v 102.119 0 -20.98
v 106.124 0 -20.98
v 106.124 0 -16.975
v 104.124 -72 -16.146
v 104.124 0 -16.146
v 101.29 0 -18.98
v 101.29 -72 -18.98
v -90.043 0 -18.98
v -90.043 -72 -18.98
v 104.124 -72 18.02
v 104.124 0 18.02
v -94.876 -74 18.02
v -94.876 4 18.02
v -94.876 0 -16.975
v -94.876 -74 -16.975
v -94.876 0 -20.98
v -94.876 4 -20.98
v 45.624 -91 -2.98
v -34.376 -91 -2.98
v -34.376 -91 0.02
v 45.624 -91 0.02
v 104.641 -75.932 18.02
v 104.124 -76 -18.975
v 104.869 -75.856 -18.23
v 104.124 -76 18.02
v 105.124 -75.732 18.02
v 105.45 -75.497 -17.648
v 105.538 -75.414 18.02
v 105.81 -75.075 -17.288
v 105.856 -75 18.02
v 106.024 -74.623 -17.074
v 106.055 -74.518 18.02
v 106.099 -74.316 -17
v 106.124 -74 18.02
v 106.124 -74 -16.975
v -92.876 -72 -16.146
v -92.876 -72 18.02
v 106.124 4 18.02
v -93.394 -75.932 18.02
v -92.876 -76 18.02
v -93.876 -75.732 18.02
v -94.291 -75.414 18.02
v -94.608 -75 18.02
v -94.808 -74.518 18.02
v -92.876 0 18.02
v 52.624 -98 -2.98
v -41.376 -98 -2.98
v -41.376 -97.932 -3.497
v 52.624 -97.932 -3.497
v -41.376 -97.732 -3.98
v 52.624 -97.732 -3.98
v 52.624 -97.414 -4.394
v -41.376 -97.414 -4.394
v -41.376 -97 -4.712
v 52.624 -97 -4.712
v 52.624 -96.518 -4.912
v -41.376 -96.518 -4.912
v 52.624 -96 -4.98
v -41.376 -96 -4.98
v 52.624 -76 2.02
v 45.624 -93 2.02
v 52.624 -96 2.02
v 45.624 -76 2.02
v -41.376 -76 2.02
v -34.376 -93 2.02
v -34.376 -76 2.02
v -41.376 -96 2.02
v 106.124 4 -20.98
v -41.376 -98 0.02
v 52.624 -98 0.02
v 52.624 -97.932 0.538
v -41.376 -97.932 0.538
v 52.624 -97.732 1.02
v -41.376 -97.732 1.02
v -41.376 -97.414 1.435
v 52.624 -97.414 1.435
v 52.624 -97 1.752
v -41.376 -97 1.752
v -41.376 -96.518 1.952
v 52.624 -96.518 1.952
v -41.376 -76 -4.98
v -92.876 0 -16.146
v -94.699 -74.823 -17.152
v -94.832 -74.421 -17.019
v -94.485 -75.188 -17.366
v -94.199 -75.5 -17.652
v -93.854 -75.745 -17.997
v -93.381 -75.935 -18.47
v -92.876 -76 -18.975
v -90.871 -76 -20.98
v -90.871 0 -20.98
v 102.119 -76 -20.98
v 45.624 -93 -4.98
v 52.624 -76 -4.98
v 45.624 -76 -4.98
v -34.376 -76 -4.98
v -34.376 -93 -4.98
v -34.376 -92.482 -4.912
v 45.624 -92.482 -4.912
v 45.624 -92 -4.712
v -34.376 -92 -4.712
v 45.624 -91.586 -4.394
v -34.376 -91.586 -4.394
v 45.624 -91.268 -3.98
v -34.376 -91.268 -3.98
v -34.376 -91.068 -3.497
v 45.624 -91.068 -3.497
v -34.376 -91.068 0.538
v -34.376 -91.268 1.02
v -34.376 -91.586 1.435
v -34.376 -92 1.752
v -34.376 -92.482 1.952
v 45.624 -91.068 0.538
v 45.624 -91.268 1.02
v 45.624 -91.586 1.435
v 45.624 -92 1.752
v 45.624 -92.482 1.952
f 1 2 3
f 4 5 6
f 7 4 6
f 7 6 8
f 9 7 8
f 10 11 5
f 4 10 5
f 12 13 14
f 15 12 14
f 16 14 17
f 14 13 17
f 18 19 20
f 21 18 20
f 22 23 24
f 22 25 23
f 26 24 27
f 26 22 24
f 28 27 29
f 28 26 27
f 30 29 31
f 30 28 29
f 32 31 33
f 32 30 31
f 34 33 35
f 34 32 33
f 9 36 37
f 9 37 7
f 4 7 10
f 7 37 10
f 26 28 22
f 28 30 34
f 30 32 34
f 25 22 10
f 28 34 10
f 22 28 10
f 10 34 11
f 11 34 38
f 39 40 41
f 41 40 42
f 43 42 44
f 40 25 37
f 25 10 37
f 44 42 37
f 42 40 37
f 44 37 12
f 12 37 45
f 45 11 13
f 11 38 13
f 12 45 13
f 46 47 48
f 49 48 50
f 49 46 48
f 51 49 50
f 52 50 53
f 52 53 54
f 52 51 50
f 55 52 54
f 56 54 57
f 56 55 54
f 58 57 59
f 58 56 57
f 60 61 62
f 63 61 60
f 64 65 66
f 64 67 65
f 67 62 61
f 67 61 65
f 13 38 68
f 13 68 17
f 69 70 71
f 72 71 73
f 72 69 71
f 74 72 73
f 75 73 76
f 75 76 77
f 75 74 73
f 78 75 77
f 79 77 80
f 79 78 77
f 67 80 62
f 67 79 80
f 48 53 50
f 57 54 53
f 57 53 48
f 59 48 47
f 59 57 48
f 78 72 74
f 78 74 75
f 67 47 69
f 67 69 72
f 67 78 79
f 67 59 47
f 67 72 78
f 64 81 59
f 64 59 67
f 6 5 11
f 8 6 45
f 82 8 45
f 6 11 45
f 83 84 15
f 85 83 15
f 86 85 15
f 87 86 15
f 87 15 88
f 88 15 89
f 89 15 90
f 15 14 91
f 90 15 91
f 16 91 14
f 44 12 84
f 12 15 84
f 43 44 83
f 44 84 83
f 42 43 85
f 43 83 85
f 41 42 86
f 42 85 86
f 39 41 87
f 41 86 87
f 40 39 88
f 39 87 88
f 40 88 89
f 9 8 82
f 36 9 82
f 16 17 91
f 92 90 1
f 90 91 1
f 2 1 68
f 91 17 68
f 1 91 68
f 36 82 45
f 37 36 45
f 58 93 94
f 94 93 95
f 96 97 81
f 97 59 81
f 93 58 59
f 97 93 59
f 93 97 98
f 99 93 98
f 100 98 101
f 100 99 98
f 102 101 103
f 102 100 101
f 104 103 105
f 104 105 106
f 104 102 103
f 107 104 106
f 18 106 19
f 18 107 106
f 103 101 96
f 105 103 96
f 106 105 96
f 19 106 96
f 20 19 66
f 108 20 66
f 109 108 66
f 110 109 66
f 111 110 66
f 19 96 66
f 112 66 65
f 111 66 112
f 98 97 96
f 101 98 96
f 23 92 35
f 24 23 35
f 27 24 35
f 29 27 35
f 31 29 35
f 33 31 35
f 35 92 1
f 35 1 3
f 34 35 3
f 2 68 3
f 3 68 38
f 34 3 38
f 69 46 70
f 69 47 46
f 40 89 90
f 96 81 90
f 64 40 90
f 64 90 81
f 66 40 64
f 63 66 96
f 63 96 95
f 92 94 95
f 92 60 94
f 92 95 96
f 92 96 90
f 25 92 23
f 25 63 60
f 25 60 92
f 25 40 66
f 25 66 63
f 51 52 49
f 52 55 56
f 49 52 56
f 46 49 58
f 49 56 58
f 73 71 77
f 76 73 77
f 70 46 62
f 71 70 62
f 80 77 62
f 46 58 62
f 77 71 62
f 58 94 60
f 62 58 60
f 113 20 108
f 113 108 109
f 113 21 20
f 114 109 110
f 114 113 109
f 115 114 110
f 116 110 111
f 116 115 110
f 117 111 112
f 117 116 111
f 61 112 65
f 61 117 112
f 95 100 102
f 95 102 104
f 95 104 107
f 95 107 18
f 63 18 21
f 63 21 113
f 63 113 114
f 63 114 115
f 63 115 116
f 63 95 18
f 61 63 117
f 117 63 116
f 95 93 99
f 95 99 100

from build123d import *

# Parameters (mm, degrees)
F1_DEPTH  = 72
F2_W      = 201
F2_H      = 39
F3_DEPTH  = 4
F5_DEPTH  = 4
F6_R      = 2
F7_W      = 7
F7_H      = 7
F8_DEPTH  = 22
F9_W      = 7
F9_H      = 7
F10_DEPTH = 80
F11_R     = 2


with BuildPart() as f1:
    # F0 (on Front) → F1 (new body)
    with BuildSketch(Plane.XZ):
        Polygon((-92.8763775631, 18.0203217369), (-94.8763775631, 18.0203217369), (-94.8763775631, -16.9746782631), (-90.8713775631, -20.9796782631), (102.1186224369, -20.9796782631), (106.1236224369, -16.9746782631), (106.1236224369, 18.0203217369), (104.1236224369, 18.0203217369), (104.1236224369, -16.1462511383), (101.2901953121, -18.9796782631), (-90.0429504384, -18.9796782631), (-92.8763775631, -16.1462511383), align=None)
    extrude(amount=F1_DEPTH)

    # F2 (on face) → F3 (join)
    with BuildSketch(Plane(origin=(0, 0, 0), x_dir=(-1, 0, 0), z_dir=(0, 1, 0))):
        with Locations((-5.6236224369, -1.4796782631)):
            Rectangle(F2_W, F2_H)
    extrude(amount=F3_DEPTH)

    # F4 (on face) → F5 (join)
    with BuildSketch(Plane.XZ.offset(72)):
        Polygon((106.1236224369, 18.0203217369), (-94.8763775631, 18.0203217369), (-94.8763775631, -16.9746782631), (-90.8713775631, -20.9796782631), (102.1186224369, -20.9796782631), (106.1236224369, -16.9746782631), align=None)
    extrude(amount=F5_DEPTH)

    # F6
    f6_edges = [f1.edges().sort_by_distance(p)[0] for p in [
        (-94.876378, -76, 0.522822),
        (106.123622, -76, 0.522822),
    ]]
    fillet(f6_edges, radius=F6_R)

    # F7 (on face) → F8 (join)
    with BuildSketch(Plane.XZ.offset(76)):
        with Locations((49.1236224369, -1.4796782631)):
            Rectangle(F7_W, F7_H)
        with Locations((-37.8763775631, -1.4796782631)):
            Rectangle(F7_W, F7_H)
    extrude(amount=F8_DEPTH)

    # F9 (on face) → F10 (join)
    with BuildSketch(Plane.YZ.offset(-34.3763775631)):
        with Locations((-94.5, -1.4796782631)):
            Rectangle(F9_W, F9_H)
    extrude(amount=F10_DEPTH)

    # F11
    f11_edges = [f1.edges().sort_by_distance(p)[0] for p in [
        (5.623622, -98, 2.020322),
        (5.623622, -98, -4.979678),
        (5.623622, -91, 2.020322),
        (5.623622, -91, -4.979678),
    ]]
    fillet(f11_edges, radius=F11_R)


solid = f1.part
